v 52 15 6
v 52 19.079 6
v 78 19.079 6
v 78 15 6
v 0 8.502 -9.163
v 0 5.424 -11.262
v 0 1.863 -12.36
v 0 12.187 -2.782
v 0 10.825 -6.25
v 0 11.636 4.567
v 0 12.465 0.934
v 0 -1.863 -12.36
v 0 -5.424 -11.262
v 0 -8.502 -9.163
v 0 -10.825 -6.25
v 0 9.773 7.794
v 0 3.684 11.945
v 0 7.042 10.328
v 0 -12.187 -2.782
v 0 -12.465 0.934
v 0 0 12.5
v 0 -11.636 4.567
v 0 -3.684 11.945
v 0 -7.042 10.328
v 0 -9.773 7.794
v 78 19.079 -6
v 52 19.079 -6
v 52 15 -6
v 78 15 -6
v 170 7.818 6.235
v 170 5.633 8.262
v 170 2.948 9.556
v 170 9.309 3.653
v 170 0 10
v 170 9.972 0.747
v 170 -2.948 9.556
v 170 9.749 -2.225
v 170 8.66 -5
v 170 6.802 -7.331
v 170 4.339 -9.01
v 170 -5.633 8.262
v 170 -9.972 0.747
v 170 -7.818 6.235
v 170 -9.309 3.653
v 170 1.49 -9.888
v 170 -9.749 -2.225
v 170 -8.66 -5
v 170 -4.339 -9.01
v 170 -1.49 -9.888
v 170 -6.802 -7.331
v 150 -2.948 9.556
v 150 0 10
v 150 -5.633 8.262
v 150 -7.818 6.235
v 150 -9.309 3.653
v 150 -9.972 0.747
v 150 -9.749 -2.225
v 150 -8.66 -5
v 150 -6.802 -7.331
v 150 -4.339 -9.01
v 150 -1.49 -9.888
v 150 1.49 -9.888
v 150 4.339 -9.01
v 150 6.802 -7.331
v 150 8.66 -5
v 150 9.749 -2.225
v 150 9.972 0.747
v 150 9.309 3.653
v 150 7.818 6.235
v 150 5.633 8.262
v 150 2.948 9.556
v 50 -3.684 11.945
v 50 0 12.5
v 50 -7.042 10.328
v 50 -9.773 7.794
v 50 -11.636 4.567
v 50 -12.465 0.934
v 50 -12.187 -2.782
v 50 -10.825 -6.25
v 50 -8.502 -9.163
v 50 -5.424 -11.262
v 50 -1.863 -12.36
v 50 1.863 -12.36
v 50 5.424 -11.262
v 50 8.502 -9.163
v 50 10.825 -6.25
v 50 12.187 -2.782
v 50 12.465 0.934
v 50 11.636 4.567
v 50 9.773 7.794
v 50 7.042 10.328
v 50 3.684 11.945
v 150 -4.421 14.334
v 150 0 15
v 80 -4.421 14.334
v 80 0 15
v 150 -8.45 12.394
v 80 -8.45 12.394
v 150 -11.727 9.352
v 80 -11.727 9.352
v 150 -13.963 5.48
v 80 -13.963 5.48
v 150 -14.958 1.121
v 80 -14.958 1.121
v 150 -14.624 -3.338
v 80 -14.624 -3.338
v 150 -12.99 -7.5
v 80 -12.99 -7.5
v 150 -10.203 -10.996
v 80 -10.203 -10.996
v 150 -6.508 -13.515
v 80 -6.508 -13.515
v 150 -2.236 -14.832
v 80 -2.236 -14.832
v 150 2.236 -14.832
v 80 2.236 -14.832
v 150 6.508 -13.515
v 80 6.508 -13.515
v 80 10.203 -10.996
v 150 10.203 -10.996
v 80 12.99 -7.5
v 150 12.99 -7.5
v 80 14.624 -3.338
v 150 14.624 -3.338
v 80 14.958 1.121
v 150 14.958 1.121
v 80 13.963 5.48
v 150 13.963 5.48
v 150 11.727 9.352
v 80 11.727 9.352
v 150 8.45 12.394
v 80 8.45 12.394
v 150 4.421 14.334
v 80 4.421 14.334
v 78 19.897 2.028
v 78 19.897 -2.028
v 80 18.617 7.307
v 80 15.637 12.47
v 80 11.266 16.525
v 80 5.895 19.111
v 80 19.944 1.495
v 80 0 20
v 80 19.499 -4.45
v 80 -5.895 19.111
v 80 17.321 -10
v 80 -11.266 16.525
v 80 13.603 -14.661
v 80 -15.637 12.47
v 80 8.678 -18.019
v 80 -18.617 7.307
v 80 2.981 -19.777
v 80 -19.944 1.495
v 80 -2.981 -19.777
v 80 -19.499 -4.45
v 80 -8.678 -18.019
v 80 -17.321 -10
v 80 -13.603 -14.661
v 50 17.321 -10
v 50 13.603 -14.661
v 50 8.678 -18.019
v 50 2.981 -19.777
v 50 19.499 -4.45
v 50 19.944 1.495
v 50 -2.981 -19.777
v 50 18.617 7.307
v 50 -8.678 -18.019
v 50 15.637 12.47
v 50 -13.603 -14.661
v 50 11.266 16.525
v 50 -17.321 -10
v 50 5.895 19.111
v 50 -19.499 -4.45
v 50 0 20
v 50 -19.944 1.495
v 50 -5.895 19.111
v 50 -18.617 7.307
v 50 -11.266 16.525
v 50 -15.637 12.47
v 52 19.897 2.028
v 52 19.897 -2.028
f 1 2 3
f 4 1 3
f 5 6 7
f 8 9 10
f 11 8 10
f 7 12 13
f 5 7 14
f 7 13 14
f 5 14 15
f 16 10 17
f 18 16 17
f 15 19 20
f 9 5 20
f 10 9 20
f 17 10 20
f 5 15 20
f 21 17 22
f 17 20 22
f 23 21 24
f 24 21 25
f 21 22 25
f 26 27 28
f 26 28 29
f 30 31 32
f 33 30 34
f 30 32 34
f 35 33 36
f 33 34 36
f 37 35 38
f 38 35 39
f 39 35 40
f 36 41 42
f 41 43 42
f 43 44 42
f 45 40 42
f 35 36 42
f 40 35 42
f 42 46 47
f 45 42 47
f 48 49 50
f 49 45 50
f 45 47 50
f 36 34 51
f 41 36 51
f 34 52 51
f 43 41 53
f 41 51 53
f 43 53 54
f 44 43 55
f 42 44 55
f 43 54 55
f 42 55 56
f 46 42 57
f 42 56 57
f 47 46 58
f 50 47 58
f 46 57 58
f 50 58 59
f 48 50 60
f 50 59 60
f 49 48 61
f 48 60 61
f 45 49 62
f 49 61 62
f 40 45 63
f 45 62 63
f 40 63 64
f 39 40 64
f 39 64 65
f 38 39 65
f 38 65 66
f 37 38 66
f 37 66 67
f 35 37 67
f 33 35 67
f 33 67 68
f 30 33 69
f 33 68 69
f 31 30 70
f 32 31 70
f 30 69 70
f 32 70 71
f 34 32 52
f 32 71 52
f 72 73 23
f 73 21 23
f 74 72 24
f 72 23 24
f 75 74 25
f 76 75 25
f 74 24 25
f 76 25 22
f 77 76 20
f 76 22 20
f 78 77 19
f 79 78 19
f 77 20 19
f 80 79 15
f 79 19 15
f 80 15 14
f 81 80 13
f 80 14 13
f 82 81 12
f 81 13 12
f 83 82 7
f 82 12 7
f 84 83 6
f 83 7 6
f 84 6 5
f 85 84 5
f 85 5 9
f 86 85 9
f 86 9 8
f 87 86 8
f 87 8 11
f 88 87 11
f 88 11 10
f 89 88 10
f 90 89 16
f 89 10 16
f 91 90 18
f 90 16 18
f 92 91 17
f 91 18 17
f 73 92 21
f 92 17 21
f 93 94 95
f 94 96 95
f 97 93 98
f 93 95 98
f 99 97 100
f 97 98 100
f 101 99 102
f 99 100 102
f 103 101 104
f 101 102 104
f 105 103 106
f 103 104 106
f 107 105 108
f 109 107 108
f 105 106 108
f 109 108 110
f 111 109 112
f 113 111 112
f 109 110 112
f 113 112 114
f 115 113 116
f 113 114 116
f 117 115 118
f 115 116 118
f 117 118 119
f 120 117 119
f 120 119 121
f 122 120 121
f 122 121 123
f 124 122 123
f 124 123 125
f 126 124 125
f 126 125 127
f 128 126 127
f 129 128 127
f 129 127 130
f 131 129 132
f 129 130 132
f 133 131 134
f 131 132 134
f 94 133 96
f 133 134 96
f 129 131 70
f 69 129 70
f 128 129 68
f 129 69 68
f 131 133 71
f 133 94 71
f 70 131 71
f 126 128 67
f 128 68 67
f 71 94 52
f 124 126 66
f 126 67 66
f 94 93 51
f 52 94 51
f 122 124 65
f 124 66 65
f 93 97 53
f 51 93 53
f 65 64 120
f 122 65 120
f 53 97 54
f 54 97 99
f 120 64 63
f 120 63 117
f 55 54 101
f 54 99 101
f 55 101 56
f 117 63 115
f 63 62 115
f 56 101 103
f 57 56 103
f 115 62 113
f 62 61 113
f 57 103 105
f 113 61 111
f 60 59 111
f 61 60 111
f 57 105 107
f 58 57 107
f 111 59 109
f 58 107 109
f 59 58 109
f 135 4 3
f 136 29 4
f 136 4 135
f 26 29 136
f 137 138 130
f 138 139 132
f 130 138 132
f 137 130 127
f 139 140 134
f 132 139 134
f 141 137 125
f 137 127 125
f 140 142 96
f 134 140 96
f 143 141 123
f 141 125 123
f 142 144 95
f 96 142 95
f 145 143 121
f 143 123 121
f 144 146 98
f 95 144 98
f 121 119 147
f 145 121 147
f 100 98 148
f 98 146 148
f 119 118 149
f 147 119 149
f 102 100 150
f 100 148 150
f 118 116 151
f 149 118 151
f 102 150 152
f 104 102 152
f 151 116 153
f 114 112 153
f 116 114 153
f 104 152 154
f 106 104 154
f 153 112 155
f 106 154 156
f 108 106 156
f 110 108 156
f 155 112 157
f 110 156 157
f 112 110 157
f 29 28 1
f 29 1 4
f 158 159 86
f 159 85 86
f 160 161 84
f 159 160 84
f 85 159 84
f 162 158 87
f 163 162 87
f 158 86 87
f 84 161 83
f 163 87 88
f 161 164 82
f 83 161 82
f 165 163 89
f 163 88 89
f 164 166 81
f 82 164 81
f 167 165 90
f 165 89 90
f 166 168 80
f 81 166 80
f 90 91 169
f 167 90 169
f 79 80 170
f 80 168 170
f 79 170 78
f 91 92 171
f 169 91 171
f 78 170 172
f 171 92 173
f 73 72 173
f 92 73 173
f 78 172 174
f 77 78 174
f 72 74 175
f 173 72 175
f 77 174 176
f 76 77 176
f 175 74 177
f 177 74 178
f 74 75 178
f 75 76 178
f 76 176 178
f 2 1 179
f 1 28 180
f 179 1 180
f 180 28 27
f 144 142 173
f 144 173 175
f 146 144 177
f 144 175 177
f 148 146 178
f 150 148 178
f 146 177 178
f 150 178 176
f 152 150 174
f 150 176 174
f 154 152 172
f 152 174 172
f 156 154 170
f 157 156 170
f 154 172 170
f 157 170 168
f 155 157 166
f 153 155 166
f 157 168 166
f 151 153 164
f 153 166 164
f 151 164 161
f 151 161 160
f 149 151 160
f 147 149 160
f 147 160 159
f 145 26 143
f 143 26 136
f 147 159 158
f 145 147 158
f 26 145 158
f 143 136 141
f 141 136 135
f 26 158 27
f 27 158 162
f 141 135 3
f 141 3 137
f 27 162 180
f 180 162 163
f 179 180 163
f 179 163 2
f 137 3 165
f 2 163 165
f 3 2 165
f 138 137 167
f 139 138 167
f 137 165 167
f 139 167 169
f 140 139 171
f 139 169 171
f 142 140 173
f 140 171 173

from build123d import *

# Parameters (mm, degrees)
CUT_EXTRUDE_1_DEPTH      = 6
CUT_EXTRUDE_1_DEPTH_BACK = 6
SKETCH_2_W               = 26
SKETCH_2_H               = 10


with BuildPart() as part:
    # 草图1 → 旋转1 (revolve)
    with BuildSketch(Plane.XY):
        Polygon((0, 0), (170, 0), (170, 10), (150, 10), (150, 15), (80, 15), (80, 20), (50, 20), (50, 12.5), (0, 12.5), align=None)
    revolve(axis=Axis((-10, 0, 0), (1, 0, 0)))

    # 草图2 → 切除-拉伸1 (cut, two sides: drawn at the far end of the back side and taken through both)
    with BuildSketch(Plane.XY.offset(-CUT_EXTRUDE_1_DEPTH_BACK)):
        with Locations((65, 20)):
            Rectangle(SKETCH_2_W, SKETCH_2_H)
    extrude(amount=CUT_EXTRUDE_1_DEPTH + CUT_EXTRUDE_1_DEPTH_BACK, mode=Mode.SUBTRACT)


solid = part.part
